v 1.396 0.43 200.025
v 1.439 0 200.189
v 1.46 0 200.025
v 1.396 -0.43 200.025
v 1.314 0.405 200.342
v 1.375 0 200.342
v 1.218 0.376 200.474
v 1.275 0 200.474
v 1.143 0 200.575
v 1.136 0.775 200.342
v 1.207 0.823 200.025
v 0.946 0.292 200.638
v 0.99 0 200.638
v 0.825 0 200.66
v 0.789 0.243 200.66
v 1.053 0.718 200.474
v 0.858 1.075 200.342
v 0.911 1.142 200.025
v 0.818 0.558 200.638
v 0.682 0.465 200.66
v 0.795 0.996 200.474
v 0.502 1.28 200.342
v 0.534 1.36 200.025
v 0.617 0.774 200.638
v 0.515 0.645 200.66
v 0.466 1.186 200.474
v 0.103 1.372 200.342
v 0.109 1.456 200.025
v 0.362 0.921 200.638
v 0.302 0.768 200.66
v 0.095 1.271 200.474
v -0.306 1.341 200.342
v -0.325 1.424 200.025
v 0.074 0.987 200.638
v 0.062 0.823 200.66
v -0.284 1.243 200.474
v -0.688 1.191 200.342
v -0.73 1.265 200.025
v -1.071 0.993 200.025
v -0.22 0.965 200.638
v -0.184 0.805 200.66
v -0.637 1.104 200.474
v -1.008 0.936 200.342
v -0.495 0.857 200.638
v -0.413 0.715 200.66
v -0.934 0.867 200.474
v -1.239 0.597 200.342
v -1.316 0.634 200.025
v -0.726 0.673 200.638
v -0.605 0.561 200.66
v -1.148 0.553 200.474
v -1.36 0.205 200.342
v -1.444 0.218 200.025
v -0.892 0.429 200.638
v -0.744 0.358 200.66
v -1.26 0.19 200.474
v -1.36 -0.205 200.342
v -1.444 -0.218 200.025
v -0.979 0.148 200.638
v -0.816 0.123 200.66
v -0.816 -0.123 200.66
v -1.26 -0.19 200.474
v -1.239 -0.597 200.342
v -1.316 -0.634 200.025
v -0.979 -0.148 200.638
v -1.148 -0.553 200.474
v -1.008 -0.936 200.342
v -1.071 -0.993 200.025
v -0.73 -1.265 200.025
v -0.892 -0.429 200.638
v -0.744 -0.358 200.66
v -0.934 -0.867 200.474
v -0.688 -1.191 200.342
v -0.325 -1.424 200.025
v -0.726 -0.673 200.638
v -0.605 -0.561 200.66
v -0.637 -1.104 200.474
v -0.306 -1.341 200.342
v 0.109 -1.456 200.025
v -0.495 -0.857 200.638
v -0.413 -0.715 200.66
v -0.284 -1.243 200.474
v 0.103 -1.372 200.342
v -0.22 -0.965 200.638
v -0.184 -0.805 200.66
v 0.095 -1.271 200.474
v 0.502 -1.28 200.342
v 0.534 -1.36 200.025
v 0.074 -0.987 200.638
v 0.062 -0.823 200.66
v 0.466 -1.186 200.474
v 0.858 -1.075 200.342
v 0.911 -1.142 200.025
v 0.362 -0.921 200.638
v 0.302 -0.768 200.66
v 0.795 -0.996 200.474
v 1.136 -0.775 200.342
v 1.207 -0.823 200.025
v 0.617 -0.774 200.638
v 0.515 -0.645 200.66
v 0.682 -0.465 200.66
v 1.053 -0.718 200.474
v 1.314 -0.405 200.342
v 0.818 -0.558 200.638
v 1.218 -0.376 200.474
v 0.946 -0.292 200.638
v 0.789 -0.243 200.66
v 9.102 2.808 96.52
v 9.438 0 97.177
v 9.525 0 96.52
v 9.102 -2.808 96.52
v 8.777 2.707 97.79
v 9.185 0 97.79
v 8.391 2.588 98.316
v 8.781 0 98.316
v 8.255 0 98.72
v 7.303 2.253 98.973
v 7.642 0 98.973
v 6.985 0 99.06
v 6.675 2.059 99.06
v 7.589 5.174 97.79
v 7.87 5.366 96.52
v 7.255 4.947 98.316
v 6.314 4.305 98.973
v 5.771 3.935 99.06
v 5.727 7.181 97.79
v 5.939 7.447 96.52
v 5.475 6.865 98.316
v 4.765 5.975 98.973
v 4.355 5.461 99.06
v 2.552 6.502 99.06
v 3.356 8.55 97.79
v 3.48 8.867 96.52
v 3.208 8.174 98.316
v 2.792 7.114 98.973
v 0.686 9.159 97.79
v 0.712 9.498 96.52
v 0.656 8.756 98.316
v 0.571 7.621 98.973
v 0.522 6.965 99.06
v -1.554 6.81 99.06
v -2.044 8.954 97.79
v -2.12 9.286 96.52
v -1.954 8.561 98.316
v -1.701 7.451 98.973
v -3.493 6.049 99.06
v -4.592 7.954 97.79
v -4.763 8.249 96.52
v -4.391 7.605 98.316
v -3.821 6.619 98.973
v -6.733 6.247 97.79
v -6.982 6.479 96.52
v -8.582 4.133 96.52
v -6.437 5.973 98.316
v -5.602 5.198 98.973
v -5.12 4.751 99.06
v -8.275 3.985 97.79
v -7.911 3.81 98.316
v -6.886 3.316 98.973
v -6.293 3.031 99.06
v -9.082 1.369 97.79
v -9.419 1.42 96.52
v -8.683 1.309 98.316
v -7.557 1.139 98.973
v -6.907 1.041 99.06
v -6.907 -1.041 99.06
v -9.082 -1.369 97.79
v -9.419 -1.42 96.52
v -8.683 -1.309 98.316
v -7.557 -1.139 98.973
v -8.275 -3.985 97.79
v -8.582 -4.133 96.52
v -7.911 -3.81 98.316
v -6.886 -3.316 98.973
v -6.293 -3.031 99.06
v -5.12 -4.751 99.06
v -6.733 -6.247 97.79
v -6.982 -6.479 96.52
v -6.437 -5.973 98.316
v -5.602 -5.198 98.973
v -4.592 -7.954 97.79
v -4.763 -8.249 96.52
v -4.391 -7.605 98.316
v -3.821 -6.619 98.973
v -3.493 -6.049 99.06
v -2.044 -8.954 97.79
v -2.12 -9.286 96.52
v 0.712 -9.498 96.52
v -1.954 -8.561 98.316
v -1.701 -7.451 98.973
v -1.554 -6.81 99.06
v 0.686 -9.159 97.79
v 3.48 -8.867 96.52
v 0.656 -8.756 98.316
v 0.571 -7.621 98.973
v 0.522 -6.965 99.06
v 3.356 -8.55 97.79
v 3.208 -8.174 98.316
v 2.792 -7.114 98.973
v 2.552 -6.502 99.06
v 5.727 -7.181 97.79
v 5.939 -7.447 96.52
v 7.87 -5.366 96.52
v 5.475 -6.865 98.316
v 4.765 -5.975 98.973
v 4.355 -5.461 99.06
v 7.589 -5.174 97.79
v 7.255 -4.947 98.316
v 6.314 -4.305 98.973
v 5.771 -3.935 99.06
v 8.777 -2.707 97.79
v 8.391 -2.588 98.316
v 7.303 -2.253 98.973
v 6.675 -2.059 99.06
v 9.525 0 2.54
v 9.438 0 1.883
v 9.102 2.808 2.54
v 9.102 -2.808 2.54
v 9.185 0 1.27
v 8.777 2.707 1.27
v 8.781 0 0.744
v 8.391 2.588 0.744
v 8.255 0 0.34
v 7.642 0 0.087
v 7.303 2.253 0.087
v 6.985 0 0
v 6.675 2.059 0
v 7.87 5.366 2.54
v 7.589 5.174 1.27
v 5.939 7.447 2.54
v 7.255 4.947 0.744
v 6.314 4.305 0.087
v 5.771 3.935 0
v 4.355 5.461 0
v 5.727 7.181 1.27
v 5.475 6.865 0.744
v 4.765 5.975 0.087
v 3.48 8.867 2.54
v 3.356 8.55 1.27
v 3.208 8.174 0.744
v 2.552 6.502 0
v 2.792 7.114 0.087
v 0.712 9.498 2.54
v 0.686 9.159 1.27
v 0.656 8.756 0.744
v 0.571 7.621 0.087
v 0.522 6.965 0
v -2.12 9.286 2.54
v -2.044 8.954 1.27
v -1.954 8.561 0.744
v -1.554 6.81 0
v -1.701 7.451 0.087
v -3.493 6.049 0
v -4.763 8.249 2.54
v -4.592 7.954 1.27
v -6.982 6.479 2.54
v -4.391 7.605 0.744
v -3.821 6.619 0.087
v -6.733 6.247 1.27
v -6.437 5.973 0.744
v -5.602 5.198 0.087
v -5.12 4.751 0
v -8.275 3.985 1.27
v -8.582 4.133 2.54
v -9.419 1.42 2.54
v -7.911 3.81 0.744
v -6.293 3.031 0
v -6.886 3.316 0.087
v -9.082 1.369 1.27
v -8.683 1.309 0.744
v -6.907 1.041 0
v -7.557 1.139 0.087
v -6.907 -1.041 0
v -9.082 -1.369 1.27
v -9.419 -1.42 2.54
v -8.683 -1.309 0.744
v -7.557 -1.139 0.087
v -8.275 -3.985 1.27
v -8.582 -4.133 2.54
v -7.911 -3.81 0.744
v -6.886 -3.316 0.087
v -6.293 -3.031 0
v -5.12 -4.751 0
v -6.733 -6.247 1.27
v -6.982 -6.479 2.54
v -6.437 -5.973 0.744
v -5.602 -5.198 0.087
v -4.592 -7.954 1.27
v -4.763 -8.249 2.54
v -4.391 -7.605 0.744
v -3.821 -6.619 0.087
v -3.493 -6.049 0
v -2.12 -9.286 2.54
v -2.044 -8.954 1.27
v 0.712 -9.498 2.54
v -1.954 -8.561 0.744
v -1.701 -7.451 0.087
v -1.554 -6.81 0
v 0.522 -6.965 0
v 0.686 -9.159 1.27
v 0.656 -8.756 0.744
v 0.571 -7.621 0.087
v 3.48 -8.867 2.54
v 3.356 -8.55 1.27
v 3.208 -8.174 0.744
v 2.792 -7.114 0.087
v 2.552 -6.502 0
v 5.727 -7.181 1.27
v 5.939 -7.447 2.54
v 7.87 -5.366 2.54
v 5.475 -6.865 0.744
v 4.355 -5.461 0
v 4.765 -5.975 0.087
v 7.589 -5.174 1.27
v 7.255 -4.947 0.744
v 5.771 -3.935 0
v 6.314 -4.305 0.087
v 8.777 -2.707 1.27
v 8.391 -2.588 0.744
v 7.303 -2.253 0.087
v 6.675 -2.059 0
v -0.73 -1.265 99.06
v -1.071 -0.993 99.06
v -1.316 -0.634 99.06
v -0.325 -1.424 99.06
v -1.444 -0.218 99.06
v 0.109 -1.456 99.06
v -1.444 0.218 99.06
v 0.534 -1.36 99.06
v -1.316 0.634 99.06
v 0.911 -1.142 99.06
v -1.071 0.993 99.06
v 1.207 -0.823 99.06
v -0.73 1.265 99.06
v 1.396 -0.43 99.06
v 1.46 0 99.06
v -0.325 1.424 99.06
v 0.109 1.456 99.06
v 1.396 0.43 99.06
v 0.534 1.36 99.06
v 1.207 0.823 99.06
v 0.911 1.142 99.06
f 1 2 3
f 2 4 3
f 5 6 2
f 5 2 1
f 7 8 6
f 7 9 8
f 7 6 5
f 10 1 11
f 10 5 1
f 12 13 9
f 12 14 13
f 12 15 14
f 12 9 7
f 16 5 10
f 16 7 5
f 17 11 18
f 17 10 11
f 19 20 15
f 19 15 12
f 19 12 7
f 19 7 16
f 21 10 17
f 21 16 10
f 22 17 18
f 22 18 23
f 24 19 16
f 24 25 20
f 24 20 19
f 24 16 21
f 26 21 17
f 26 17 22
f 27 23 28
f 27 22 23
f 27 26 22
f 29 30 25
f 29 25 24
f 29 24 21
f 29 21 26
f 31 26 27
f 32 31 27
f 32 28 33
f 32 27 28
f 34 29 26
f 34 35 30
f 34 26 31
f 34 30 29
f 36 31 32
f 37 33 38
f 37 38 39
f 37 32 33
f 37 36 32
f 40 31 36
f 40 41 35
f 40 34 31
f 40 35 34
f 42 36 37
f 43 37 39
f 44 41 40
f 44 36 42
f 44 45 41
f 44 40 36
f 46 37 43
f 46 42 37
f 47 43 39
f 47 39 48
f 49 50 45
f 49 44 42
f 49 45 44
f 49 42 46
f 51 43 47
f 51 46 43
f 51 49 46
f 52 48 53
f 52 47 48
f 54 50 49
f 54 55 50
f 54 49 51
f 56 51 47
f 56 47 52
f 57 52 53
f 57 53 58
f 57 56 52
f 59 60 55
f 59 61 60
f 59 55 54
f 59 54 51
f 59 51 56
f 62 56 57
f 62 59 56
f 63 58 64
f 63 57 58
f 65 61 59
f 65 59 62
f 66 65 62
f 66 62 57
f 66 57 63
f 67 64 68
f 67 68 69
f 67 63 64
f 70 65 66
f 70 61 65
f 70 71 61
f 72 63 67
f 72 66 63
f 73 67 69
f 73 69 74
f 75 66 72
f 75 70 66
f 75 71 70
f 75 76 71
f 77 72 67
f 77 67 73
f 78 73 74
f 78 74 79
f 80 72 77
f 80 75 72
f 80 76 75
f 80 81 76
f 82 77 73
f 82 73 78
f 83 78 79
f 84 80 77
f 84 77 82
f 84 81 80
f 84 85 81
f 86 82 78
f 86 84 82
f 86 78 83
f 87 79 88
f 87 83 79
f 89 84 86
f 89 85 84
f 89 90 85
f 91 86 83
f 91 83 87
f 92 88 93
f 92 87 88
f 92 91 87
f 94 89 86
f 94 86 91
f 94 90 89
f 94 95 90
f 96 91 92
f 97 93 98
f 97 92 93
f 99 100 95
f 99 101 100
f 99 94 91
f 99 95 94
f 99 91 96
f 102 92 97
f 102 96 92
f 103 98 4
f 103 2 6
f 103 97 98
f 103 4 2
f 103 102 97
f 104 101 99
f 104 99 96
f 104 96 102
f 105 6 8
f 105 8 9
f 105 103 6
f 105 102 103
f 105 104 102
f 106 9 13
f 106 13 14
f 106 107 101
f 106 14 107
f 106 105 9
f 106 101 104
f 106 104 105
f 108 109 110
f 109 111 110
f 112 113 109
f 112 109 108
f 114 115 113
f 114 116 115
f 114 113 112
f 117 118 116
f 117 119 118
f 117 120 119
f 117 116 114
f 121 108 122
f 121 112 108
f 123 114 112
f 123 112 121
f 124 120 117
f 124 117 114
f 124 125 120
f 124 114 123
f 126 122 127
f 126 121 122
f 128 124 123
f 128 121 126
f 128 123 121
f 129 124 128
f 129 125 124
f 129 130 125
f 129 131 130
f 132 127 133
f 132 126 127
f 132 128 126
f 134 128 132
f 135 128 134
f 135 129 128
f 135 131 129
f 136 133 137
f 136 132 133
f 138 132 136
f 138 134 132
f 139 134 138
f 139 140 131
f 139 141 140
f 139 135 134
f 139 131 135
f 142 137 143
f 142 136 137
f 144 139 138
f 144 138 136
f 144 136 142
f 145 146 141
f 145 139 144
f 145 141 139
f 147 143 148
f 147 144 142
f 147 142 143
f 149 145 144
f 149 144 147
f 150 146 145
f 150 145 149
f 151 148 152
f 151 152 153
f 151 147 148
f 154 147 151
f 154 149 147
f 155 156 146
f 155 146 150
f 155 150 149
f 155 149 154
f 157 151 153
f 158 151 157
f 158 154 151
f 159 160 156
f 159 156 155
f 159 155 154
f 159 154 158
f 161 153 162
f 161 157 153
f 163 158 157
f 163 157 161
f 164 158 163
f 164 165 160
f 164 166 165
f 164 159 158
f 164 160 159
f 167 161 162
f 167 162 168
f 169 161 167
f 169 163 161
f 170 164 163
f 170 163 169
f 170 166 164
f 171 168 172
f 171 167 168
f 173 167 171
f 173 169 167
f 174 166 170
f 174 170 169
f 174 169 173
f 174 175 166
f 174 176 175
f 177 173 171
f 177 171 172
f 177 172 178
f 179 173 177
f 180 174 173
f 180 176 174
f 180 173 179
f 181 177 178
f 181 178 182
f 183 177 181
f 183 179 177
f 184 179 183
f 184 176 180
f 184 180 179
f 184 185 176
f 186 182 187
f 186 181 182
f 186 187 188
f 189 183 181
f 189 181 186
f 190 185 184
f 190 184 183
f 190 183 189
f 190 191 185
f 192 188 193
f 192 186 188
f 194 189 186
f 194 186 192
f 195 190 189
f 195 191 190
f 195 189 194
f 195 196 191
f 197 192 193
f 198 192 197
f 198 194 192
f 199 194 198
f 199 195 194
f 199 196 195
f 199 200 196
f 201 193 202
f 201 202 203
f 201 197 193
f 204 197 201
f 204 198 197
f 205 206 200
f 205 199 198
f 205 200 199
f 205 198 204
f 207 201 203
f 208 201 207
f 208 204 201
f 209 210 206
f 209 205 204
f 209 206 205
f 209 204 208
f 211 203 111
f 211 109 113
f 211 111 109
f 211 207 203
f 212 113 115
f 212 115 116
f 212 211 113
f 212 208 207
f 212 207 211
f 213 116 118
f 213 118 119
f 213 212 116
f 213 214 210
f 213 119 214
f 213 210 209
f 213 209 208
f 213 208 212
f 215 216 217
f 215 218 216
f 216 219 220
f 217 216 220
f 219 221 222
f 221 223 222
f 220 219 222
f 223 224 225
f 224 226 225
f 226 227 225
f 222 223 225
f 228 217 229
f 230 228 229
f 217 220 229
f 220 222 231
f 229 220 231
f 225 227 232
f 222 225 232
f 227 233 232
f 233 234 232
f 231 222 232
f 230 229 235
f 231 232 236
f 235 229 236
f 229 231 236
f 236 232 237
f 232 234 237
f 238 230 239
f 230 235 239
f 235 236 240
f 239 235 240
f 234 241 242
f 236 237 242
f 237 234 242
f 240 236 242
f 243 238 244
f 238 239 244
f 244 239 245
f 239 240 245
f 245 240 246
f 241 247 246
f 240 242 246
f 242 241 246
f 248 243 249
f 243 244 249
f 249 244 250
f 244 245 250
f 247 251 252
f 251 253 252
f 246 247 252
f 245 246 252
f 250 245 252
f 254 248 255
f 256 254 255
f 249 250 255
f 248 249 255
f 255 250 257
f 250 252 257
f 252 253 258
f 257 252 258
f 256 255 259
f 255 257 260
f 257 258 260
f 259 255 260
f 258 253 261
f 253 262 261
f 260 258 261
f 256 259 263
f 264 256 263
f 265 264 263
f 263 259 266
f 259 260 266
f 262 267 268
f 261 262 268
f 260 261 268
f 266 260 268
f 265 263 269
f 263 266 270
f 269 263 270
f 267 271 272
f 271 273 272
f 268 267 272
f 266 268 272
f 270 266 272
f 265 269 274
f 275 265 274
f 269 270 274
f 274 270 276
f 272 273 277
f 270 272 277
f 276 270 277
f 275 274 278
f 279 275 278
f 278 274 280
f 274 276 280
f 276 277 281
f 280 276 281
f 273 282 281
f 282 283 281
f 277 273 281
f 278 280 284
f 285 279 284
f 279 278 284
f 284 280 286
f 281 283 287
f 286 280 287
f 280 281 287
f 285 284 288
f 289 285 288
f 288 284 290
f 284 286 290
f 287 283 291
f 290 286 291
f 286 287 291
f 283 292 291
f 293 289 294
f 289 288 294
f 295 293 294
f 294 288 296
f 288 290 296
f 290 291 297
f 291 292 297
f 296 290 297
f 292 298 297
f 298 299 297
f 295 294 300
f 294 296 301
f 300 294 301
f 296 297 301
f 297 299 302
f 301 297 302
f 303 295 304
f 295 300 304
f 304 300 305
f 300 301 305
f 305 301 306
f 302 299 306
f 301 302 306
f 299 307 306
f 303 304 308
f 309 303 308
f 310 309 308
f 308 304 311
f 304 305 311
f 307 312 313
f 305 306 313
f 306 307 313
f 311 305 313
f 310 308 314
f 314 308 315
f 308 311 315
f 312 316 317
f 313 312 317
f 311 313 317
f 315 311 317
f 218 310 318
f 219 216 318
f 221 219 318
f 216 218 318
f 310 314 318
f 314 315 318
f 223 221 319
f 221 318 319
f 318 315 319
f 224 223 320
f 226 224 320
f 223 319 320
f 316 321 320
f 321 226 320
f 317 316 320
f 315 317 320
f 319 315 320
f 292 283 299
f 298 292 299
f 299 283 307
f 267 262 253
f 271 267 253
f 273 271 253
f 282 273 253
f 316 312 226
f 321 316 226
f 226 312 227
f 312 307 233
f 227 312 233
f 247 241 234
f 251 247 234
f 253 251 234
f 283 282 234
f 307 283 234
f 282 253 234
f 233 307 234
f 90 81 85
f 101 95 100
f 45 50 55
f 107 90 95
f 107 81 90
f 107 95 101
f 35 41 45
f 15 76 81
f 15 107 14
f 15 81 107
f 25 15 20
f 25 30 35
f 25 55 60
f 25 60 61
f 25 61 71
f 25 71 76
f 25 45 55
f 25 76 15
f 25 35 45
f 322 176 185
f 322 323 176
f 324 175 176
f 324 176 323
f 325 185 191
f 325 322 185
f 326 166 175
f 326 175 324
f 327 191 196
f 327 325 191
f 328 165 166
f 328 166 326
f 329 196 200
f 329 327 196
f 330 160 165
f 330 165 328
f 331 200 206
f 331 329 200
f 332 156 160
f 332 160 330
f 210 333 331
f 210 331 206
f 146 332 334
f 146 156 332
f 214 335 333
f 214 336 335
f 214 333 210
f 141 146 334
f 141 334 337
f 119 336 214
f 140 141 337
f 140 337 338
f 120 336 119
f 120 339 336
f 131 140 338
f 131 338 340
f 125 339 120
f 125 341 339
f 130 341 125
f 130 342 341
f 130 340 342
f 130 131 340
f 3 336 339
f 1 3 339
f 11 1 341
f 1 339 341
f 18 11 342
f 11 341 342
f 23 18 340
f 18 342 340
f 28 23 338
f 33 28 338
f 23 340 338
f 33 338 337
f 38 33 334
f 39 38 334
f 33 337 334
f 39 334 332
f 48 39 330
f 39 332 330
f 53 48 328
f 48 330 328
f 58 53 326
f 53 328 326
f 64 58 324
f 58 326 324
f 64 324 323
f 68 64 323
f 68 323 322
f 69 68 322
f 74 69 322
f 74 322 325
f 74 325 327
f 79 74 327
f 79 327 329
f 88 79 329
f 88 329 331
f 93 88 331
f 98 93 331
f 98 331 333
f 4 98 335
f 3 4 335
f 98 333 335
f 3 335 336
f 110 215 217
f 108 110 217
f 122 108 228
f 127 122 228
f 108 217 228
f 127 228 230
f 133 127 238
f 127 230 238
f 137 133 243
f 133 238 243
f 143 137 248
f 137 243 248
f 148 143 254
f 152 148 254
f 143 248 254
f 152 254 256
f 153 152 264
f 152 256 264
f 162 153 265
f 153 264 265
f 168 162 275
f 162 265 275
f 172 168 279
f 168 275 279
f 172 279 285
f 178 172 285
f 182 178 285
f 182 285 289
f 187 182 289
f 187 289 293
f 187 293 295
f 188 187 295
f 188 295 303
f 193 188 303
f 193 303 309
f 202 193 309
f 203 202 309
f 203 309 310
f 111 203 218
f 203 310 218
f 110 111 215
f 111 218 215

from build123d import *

# Parameters (mm, degrees)
F0_R     = 9.525
F1_DEPTH = 99.06
F2_R     = 1.4605
F3_DEPTH = 101.6
F4_R     = 0.635
F5_R     = 2.54
F6_R     = 2.54


with BuildPart() as f1:
    # F0 (on Top) → F1 (new body)
    with BuildSketch(Plane.XY):
        Circle(F0_R)
    extrude(amount=F1_DEPTH)

    # F2 (on face) → F3 (join)
    with BuildSketch(Plane.XY.offset(99.06)):
        Circle(F2_R)
    extrude(amount=F3_DEPTH)

    # F4
    f4_edges = [f1.edges().sort_by_distance(p)[0] for p in [
        (-1.4605, 0, 200.66),
    ]]
    fillet(f4_edges, radius=F4_R)

    # F5
    f5_edges = [f1.edges().sort_by_distance(p)[0] for p in [
        (-9.525, 0, 0),
    ]]
    fillet(f5_edges, radius=F5_R)

    # F6
    f6_edges = [f1.edges().sort_by_distance(p)[0] for p in [
        (-9.525, 0, 99.06),
    ]]
    fillet(f6_edges, radius=F6_R)


solid = f1.part
